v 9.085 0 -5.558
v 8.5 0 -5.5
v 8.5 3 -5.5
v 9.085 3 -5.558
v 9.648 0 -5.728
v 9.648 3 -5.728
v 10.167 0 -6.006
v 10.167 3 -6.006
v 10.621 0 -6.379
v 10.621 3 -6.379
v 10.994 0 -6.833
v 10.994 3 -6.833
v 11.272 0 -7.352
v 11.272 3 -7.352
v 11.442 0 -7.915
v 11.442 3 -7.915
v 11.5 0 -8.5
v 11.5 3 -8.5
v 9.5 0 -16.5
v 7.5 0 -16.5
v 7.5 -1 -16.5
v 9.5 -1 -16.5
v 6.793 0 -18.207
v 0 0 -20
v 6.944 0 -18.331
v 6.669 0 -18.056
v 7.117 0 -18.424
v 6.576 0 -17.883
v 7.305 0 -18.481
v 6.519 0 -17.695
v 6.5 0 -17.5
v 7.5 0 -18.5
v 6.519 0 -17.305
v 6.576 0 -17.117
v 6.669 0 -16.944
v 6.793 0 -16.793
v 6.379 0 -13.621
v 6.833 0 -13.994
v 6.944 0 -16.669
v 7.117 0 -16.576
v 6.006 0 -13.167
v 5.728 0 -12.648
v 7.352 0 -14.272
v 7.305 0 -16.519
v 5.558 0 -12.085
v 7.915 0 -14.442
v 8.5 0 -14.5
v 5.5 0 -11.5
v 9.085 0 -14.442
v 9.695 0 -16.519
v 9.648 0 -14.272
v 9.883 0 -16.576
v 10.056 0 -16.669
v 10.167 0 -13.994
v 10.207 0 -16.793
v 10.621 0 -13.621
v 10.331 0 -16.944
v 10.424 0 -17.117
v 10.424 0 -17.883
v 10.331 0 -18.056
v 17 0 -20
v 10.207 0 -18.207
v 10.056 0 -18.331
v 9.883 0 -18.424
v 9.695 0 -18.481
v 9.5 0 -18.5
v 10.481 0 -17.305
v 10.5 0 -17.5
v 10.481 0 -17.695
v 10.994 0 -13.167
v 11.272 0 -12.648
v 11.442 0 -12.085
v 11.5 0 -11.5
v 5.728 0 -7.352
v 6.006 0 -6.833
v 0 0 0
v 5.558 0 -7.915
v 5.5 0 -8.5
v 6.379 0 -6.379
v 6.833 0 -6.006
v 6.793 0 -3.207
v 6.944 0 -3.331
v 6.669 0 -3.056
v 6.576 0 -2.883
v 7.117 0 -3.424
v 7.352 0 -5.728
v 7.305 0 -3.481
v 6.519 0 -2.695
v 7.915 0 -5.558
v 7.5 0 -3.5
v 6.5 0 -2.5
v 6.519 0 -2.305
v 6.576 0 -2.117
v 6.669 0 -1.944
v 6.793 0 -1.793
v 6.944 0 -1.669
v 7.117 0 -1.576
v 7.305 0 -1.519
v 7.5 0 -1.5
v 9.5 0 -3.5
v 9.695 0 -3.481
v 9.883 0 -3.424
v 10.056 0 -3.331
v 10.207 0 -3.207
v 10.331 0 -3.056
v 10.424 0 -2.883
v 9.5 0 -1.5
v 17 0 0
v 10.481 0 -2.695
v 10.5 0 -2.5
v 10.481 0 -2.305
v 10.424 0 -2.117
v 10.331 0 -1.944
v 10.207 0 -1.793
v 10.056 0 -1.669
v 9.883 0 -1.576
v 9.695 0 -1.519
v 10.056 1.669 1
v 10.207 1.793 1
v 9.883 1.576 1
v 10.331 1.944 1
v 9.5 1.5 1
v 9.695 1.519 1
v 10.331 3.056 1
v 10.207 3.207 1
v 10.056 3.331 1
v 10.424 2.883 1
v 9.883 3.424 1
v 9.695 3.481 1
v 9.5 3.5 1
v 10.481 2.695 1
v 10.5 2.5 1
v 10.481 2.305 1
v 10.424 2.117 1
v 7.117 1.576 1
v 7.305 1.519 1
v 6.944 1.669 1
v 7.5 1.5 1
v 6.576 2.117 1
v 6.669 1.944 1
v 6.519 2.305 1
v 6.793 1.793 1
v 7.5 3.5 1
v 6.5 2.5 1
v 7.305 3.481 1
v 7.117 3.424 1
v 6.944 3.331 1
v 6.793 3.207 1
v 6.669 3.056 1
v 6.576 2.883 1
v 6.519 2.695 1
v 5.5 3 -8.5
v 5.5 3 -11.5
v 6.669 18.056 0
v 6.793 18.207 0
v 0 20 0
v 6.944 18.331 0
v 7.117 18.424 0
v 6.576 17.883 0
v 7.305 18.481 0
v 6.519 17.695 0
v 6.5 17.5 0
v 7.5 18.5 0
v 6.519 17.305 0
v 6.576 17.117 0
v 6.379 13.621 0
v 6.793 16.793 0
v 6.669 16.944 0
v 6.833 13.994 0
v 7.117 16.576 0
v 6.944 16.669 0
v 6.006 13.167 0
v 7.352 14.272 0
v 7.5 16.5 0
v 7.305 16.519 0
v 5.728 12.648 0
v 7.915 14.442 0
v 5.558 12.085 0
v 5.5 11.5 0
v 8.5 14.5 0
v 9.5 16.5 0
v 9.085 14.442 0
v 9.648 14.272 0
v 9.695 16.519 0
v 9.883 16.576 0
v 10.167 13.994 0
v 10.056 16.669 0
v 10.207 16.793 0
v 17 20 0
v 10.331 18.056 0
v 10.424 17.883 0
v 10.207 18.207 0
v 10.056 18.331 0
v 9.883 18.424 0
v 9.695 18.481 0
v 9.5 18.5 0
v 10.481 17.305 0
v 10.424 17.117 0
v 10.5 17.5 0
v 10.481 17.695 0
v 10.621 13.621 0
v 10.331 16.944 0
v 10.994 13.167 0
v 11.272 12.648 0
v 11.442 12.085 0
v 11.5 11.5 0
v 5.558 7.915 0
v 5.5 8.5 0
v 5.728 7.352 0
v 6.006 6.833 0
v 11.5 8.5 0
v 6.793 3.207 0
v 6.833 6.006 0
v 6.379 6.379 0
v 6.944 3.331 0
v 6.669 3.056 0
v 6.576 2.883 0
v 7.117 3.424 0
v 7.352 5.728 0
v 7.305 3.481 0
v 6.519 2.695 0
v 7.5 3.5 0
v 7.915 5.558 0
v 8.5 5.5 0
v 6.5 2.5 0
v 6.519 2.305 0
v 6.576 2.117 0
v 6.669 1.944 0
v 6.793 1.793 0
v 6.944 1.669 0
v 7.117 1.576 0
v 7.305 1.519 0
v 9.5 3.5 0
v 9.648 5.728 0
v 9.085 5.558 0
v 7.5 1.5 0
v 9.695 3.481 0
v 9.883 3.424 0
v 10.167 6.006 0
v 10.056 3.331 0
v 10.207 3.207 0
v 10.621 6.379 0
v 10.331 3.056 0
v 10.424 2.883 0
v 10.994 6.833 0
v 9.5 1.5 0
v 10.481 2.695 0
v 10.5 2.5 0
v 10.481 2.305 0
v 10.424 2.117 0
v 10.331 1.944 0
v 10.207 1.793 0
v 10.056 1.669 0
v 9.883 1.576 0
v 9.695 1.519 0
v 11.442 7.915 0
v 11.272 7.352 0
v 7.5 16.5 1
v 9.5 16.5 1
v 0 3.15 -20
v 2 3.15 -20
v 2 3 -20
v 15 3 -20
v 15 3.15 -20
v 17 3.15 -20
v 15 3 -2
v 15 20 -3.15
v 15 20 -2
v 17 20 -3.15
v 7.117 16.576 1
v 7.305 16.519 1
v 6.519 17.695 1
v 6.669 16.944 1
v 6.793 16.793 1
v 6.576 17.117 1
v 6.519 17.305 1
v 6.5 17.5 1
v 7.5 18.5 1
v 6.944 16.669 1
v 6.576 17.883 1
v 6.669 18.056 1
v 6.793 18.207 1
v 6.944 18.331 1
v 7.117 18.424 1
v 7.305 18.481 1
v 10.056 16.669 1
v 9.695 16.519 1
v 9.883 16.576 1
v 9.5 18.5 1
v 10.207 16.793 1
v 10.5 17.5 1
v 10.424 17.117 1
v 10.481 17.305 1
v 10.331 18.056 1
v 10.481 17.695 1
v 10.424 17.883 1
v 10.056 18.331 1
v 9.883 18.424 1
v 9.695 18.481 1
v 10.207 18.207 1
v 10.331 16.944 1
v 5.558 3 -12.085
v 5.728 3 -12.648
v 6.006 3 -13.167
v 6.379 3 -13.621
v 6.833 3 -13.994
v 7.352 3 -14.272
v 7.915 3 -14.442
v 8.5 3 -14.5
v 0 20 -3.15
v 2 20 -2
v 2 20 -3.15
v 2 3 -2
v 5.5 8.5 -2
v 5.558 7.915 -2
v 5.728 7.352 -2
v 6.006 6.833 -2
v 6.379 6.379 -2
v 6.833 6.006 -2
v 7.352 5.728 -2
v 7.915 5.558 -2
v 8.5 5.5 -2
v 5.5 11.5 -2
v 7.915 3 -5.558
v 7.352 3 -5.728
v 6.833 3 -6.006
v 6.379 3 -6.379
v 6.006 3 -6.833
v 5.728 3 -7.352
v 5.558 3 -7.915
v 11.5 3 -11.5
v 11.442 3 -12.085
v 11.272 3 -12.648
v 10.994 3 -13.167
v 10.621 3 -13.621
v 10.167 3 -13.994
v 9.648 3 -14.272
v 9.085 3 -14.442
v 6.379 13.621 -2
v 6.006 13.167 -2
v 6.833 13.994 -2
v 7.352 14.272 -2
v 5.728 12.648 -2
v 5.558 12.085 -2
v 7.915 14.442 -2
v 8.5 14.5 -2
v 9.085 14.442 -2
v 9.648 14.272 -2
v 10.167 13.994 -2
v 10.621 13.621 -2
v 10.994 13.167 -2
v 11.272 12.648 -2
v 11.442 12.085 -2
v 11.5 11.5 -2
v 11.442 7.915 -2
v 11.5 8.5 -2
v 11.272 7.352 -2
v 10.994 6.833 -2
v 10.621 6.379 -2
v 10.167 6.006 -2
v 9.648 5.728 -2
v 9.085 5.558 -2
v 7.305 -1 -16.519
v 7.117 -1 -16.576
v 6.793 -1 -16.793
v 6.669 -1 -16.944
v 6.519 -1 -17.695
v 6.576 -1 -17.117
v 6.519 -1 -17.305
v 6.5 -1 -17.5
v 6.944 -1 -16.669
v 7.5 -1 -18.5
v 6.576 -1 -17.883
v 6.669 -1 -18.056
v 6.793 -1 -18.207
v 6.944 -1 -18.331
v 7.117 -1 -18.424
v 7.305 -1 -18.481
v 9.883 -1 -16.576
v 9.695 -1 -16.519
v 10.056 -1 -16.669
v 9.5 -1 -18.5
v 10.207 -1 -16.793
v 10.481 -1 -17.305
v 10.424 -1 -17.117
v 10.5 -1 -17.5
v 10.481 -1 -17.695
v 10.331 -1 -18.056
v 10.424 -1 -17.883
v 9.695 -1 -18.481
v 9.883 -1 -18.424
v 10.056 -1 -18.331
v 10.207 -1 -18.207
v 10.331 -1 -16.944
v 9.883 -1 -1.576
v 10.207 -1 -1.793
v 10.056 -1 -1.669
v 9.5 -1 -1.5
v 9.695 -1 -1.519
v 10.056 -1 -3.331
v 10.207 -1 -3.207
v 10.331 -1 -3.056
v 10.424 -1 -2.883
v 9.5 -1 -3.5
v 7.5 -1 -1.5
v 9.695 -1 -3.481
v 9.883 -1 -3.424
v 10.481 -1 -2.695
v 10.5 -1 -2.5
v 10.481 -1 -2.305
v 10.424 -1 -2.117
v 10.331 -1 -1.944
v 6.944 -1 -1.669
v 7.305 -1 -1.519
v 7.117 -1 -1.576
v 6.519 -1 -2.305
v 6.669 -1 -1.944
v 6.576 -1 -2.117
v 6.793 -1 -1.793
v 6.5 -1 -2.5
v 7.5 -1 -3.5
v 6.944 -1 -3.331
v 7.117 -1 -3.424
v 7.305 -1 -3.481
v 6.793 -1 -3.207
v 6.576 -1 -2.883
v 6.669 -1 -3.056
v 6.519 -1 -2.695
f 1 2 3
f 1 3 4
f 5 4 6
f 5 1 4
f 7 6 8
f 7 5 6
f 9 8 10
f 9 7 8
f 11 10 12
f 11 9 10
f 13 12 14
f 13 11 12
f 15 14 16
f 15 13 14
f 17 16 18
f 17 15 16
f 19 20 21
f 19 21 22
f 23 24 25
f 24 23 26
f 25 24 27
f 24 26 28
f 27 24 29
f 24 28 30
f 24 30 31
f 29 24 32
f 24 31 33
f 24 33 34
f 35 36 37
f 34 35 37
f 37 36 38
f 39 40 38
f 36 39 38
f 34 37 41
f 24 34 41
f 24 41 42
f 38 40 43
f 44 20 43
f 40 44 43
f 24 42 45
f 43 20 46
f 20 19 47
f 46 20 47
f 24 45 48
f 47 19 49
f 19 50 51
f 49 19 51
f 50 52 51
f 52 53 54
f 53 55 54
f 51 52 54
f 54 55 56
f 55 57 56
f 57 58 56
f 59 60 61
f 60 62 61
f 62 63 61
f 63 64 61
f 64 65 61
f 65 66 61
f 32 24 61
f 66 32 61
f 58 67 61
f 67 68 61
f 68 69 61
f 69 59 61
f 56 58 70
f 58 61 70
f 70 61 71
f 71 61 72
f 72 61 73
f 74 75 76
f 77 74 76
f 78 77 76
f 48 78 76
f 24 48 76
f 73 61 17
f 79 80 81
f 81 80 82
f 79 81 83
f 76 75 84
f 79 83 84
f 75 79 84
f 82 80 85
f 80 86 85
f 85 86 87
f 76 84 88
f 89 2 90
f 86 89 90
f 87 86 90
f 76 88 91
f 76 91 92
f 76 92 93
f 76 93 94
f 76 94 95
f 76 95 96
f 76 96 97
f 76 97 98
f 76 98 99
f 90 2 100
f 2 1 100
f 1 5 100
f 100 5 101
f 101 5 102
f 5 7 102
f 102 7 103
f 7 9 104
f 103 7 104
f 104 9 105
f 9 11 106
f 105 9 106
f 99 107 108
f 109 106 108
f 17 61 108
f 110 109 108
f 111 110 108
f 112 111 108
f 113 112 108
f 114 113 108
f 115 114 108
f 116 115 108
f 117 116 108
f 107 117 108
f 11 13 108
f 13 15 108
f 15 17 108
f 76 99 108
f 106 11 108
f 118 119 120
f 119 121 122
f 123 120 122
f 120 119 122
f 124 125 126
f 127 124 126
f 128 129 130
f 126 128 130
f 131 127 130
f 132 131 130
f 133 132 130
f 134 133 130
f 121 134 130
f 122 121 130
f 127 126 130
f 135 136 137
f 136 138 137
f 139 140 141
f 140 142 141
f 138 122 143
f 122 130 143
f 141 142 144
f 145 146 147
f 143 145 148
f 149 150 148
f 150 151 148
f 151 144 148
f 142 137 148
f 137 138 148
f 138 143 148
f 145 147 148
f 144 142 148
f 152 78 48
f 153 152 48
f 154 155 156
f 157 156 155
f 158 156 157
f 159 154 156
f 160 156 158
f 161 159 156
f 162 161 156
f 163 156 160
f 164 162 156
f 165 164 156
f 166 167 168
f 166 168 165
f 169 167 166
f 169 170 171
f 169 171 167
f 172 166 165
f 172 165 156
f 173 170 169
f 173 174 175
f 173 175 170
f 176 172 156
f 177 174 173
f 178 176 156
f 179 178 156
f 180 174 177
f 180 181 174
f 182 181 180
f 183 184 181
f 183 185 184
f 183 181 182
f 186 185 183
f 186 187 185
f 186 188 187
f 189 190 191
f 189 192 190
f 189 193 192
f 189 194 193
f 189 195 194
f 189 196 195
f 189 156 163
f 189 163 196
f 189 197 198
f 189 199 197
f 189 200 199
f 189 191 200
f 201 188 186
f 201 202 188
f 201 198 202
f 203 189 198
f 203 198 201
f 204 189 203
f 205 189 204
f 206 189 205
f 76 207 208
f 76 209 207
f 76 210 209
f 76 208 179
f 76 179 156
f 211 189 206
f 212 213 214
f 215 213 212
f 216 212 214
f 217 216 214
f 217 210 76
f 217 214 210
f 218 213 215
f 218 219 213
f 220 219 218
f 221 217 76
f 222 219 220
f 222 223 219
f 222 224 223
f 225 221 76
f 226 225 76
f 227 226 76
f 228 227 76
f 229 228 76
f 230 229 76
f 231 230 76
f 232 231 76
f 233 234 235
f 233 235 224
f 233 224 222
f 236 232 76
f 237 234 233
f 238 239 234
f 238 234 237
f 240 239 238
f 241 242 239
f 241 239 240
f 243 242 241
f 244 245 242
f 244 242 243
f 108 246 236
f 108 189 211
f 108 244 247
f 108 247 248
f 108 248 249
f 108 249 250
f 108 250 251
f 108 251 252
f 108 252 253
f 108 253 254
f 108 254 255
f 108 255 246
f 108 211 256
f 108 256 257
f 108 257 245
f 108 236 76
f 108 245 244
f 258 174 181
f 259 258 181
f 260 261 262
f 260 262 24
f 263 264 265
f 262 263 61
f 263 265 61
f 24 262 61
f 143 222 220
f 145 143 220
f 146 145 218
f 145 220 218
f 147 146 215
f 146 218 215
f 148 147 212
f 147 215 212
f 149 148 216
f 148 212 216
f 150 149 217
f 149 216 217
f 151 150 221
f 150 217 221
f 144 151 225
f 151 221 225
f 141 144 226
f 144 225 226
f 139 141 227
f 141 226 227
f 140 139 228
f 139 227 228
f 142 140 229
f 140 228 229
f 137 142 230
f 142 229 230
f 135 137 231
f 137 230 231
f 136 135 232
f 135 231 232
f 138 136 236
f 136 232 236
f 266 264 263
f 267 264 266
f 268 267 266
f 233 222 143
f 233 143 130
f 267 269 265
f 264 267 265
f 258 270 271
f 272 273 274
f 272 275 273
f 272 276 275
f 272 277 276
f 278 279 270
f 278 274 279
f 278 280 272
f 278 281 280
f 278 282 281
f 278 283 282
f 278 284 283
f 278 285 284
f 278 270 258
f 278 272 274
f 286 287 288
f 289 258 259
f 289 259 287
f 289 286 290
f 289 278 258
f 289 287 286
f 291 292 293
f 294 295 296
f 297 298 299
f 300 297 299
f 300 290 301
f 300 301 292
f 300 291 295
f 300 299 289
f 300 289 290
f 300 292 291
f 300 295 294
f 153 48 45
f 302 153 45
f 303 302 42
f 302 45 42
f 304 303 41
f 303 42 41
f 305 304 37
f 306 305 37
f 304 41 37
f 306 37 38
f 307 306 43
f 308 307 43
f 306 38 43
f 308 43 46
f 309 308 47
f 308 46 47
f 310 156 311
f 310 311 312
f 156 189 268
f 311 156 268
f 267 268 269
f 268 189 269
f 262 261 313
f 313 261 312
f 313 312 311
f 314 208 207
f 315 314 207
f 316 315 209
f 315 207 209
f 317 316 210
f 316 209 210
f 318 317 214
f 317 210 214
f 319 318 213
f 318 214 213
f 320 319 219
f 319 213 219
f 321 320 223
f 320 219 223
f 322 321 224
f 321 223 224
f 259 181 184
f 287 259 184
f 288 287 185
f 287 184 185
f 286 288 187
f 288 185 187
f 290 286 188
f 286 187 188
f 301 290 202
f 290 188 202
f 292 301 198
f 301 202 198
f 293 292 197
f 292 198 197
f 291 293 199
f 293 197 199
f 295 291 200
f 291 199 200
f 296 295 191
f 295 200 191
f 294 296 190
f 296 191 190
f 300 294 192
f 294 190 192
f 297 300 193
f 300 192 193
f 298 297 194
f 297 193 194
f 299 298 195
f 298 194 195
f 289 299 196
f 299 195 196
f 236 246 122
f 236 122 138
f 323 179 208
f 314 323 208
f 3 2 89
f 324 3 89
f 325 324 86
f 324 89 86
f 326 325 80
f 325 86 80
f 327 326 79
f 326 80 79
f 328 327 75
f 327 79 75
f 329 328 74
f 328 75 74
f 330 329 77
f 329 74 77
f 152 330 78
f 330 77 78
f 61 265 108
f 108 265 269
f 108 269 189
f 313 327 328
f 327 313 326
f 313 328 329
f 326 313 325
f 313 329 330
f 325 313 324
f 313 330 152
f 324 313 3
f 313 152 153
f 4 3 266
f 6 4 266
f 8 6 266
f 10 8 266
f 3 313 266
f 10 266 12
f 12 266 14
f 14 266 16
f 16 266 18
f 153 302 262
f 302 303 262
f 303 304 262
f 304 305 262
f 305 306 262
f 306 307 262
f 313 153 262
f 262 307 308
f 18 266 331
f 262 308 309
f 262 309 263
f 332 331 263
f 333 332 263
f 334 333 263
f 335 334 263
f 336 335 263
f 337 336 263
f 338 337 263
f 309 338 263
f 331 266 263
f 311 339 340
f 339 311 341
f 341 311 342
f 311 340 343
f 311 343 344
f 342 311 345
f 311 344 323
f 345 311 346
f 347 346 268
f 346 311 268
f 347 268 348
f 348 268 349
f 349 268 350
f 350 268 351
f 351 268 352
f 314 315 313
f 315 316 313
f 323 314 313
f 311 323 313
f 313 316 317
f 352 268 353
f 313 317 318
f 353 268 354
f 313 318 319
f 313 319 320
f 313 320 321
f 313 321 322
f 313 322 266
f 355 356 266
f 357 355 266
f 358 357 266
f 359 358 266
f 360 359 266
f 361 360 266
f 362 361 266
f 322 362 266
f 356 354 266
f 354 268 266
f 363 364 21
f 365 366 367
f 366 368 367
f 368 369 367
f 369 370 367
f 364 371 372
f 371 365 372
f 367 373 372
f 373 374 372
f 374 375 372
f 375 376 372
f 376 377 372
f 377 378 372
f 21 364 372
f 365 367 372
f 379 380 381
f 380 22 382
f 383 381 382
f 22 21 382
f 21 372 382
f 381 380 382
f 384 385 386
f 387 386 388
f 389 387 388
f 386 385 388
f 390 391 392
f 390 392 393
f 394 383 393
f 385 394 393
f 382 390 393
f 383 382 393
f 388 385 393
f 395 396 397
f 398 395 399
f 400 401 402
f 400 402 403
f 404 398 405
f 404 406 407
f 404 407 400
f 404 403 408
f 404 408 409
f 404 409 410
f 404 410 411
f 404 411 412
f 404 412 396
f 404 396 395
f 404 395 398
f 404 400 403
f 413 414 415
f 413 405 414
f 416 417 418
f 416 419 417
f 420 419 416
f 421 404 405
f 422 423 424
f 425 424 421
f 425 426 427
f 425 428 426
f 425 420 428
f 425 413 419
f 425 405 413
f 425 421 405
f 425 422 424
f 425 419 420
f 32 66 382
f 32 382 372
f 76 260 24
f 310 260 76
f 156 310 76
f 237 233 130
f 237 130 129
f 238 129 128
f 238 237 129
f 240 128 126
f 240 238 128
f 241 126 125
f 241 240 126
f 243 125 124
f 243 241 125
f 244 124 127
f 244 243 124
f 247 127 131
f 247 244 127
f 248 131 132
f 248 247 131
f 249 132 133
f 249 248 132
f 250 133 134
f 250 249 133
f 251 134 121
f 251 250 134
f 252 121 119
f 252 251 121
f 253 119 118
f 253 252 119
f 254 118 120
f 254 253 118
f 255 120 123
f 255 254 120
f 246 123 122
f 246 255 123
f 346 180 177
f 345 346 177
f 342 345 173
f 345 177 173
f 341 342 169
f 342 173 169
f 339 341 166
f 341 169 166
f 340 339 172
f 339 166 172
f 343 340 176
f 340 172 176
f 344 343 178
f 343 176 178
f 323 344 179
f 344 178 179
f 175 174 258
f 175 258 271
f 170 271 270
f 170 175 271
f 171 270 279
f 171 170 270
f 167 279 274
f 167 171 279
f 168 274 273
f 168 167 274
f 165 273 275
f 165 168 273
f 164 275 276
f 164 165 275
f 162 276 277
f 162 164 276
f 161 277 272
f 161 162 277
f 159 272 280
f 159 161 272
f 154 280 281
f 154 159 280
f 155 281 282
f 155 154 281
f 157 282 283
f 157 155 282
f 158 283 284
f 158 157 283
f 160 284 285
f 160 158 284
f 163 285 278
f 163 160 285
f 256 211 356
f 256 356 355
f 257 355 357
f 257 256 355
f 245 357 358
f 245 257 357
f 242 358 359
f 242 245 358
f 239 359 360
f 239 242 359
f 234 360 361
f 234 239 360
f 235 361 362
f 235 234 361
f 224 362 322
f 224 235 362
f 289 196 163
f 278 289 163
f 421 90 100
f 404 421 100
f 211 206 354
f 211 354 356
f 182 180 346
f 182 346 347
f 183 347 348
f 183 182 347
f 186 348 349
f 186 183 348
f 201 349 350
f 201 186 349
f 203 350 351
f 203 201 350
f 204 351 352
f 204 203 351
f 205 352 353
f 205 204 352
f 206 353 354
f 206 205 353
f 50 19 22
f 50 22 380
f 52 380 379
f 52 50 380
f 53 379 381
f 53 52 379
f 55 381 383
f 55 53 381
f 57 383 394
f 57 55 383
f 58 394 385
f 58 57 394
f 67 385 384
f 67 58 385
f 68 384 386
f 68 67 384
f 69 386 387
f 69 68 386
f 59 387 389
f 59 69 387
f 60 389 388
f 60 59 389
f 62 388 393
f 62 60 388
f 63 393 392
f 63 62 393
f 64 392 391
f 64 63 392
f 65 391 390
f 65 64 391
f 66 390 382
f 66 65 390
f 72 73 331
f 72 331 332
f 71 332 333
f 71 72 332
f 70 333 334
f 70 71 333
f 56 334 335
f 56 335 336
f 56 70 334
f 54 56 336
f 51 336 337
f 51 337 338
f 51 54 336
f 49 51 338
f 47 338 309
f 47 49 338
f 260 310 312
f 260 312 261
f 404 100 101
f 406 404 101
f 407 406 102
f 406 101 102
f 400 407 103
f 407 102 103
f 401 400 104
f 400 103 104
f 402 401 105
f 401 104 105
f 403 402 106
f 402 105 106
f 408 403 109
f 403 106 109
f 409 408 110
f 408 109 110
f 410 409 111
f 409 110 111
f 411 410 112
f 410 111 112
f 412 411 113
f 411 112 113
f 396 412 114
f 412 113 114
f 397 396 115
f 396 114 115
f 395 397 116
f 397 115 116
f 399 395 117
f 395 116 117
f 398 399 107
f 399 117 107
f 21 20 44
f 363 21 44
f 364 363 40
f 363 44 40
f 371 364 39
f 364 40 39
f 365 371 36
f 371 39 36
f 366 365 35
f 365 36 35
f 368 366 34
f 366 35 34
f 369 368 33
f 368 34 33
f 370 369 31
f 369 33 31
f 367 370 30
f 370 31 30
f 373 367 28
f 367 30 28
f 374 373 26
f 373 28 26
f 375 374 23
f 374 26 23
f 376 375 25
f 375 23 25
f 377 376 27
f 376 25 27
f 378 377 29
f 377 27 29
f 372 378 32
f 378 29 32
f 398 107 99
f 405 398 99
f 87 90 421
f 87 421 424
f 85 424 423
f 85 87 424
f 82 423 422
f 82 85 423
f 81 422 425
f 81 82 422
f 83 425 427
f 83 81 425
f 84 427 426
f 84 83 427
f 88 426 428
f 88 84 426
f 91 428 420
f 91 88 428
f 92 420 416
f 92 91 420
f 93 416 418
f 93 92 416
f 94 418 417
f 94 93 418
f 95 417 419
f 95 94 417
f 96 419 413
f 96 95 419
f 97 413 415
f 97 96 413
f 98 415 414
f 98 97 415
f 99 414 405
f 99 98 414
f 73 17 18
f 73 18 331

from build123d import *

# Parameters (mm, degrees)
BOSS_EXTRUDE1_DEPTH = 2
BOSS_EXTRUDE2_DEPTH = 6.5
CUT_EXTRUDE1_DEPTH  = 6.5
CUT_EXTRUDE2_DEPTH  = 6.5
BOSS_EXTRUDE3_DEPTH = 1
BOSS_EXTRUDE4_DEPTH = 1


with BuildPart() as part:
    # Sketch1 → Boss-Extrude1 (new body)
    with BuildSketch(Plane(origin=(0, 0, 0), x_dir=(0, 0, -1), z_dir=(1, 0, 0))):
        Polygon((3.15, 20), (20, 3.15), (20, 0), (0, 0), (0, 20), align=None)
    extrude(amount=BOSS_EXTRUDE1_DEPTH)

    # Sketch2 → Boss-Extrude2 (add)
    with BuildSketch(Plane(origin=(2, 0, 0), x_dir=(0, 0, -1), z_dir=(1, 0, 0))):
        Polygon((20, 0), (0, 0), (0, 3), (0, 20), (2, 20), (2, 3), (20, 3), align=None)
    extrude(amount=BOSS_EXTRUDE2_DEPTH)

    # Sketch3 → Cut-Extrude1 (cut)
    with BuildSketch(Plane.XY):
        with BuildLine():
            Line((5.5, 11.5), (5.5, 8.5))
            ThreePointArc((5.5, 8.5), (6.378679656, 6.378679656), (8.5, 5.5))
            Line((8.5, 5.5), (8.5, 14.5))
            ThreePointArc((8.5, 14.5), (6.378679656, 13.621320344), (5.5, 11.5))
        make_face()
    extrude(amount=-CUT_EXTRUDE1_DEPTH, mode=Mode.SUBTRACT)

    # Sketch4 → Cut-Extrude2 (cut)
    with BuildSketch(Plane.XZ):
        with BuildLine():
            Line((5.5, -8.5), (5.5, -11.5))
            ThreePointArc((5.5, -11.5), (6.378679656, -13.621320344), (8.5, -14.5))
            Line((8.5, -14.5), (8.5, -5.5))
            ThreePointArc((8.5, -5.5), (6.378679656, -6.378679656), (5.5, -8.5))
        make_face()
    extrude(amount=-CUT_EXTRUDE2_DEPTH, mode=Mode.SUBTRACT)

    # Sketch5 → Boss-Extrude3 (add)
    with BuildSketch(Plane(origin=(0, 0, 0), x_dir=(-1, 0, 0), z_dir=(0, -1, 0))):
        with BuildLine():
            Line((-7.5, 1.5), (-8.5, 1.5))
            Line((-8.5, 1.5), (-8.5, 3.5))
            Line((-8.5, 3.5), (-7.5, 3.5))
            ThreePointArc((-7.5, 3.5), (-6.5, 2.5), (-7.5, 1.5))
        make_face()
        with BuildLine():
            Line((-8.5, 18.5), (-8.5, 16.5))
            Line((-8.5, 16.5), (-7.5, 16.5))
            ThreePointArc((-7.5, 16.5), (-6.5, 17.5), (-7.5, 18.5))
            Line((-7.5, 18.5), (-8.5, 18.5))
        make_face()
    extrude(amount=BOSS_EXTRUDE3_DEPTH)

    # Sketch6 → Boss-Extrude4 (add)
    with BuildSketch(Plane.XY):
        with BuildLine():
            Line((7.5, 18.5), (8.5, 18.5))
            Line((8.5, 18.5), (8.5, 16.5))
            Line((8.5, 16.5), (7.5, 16.5))
            ThreePointArc((7.5, 16.5), (6.5, 17.5), (7.5, 18.5))
        make_face()
        with BuildLine():
            Line((8.5, 1.5), (8.5, 3.5))
            Line((8.5, 3.5), (7.5, 3.5))
            ThreePointArc((7.5, 3.5), (6.5, 2.5), (7.5, 1.5))
            Line((7.5, 1.5), (8.5, 1.5))
        make_face()
    extrude(amount=BOSS_EXTRUDE4_DEPTH)

    # Mirror2: part across plane


with BuildPart() as part_1:
    add(part.part)
    add(part.part.mirror(Plane(origin=(8.5, 0, 0), x_dir=(0, 0, 1), z_dir=(1, 0, 0))))


solid = part_1.part
